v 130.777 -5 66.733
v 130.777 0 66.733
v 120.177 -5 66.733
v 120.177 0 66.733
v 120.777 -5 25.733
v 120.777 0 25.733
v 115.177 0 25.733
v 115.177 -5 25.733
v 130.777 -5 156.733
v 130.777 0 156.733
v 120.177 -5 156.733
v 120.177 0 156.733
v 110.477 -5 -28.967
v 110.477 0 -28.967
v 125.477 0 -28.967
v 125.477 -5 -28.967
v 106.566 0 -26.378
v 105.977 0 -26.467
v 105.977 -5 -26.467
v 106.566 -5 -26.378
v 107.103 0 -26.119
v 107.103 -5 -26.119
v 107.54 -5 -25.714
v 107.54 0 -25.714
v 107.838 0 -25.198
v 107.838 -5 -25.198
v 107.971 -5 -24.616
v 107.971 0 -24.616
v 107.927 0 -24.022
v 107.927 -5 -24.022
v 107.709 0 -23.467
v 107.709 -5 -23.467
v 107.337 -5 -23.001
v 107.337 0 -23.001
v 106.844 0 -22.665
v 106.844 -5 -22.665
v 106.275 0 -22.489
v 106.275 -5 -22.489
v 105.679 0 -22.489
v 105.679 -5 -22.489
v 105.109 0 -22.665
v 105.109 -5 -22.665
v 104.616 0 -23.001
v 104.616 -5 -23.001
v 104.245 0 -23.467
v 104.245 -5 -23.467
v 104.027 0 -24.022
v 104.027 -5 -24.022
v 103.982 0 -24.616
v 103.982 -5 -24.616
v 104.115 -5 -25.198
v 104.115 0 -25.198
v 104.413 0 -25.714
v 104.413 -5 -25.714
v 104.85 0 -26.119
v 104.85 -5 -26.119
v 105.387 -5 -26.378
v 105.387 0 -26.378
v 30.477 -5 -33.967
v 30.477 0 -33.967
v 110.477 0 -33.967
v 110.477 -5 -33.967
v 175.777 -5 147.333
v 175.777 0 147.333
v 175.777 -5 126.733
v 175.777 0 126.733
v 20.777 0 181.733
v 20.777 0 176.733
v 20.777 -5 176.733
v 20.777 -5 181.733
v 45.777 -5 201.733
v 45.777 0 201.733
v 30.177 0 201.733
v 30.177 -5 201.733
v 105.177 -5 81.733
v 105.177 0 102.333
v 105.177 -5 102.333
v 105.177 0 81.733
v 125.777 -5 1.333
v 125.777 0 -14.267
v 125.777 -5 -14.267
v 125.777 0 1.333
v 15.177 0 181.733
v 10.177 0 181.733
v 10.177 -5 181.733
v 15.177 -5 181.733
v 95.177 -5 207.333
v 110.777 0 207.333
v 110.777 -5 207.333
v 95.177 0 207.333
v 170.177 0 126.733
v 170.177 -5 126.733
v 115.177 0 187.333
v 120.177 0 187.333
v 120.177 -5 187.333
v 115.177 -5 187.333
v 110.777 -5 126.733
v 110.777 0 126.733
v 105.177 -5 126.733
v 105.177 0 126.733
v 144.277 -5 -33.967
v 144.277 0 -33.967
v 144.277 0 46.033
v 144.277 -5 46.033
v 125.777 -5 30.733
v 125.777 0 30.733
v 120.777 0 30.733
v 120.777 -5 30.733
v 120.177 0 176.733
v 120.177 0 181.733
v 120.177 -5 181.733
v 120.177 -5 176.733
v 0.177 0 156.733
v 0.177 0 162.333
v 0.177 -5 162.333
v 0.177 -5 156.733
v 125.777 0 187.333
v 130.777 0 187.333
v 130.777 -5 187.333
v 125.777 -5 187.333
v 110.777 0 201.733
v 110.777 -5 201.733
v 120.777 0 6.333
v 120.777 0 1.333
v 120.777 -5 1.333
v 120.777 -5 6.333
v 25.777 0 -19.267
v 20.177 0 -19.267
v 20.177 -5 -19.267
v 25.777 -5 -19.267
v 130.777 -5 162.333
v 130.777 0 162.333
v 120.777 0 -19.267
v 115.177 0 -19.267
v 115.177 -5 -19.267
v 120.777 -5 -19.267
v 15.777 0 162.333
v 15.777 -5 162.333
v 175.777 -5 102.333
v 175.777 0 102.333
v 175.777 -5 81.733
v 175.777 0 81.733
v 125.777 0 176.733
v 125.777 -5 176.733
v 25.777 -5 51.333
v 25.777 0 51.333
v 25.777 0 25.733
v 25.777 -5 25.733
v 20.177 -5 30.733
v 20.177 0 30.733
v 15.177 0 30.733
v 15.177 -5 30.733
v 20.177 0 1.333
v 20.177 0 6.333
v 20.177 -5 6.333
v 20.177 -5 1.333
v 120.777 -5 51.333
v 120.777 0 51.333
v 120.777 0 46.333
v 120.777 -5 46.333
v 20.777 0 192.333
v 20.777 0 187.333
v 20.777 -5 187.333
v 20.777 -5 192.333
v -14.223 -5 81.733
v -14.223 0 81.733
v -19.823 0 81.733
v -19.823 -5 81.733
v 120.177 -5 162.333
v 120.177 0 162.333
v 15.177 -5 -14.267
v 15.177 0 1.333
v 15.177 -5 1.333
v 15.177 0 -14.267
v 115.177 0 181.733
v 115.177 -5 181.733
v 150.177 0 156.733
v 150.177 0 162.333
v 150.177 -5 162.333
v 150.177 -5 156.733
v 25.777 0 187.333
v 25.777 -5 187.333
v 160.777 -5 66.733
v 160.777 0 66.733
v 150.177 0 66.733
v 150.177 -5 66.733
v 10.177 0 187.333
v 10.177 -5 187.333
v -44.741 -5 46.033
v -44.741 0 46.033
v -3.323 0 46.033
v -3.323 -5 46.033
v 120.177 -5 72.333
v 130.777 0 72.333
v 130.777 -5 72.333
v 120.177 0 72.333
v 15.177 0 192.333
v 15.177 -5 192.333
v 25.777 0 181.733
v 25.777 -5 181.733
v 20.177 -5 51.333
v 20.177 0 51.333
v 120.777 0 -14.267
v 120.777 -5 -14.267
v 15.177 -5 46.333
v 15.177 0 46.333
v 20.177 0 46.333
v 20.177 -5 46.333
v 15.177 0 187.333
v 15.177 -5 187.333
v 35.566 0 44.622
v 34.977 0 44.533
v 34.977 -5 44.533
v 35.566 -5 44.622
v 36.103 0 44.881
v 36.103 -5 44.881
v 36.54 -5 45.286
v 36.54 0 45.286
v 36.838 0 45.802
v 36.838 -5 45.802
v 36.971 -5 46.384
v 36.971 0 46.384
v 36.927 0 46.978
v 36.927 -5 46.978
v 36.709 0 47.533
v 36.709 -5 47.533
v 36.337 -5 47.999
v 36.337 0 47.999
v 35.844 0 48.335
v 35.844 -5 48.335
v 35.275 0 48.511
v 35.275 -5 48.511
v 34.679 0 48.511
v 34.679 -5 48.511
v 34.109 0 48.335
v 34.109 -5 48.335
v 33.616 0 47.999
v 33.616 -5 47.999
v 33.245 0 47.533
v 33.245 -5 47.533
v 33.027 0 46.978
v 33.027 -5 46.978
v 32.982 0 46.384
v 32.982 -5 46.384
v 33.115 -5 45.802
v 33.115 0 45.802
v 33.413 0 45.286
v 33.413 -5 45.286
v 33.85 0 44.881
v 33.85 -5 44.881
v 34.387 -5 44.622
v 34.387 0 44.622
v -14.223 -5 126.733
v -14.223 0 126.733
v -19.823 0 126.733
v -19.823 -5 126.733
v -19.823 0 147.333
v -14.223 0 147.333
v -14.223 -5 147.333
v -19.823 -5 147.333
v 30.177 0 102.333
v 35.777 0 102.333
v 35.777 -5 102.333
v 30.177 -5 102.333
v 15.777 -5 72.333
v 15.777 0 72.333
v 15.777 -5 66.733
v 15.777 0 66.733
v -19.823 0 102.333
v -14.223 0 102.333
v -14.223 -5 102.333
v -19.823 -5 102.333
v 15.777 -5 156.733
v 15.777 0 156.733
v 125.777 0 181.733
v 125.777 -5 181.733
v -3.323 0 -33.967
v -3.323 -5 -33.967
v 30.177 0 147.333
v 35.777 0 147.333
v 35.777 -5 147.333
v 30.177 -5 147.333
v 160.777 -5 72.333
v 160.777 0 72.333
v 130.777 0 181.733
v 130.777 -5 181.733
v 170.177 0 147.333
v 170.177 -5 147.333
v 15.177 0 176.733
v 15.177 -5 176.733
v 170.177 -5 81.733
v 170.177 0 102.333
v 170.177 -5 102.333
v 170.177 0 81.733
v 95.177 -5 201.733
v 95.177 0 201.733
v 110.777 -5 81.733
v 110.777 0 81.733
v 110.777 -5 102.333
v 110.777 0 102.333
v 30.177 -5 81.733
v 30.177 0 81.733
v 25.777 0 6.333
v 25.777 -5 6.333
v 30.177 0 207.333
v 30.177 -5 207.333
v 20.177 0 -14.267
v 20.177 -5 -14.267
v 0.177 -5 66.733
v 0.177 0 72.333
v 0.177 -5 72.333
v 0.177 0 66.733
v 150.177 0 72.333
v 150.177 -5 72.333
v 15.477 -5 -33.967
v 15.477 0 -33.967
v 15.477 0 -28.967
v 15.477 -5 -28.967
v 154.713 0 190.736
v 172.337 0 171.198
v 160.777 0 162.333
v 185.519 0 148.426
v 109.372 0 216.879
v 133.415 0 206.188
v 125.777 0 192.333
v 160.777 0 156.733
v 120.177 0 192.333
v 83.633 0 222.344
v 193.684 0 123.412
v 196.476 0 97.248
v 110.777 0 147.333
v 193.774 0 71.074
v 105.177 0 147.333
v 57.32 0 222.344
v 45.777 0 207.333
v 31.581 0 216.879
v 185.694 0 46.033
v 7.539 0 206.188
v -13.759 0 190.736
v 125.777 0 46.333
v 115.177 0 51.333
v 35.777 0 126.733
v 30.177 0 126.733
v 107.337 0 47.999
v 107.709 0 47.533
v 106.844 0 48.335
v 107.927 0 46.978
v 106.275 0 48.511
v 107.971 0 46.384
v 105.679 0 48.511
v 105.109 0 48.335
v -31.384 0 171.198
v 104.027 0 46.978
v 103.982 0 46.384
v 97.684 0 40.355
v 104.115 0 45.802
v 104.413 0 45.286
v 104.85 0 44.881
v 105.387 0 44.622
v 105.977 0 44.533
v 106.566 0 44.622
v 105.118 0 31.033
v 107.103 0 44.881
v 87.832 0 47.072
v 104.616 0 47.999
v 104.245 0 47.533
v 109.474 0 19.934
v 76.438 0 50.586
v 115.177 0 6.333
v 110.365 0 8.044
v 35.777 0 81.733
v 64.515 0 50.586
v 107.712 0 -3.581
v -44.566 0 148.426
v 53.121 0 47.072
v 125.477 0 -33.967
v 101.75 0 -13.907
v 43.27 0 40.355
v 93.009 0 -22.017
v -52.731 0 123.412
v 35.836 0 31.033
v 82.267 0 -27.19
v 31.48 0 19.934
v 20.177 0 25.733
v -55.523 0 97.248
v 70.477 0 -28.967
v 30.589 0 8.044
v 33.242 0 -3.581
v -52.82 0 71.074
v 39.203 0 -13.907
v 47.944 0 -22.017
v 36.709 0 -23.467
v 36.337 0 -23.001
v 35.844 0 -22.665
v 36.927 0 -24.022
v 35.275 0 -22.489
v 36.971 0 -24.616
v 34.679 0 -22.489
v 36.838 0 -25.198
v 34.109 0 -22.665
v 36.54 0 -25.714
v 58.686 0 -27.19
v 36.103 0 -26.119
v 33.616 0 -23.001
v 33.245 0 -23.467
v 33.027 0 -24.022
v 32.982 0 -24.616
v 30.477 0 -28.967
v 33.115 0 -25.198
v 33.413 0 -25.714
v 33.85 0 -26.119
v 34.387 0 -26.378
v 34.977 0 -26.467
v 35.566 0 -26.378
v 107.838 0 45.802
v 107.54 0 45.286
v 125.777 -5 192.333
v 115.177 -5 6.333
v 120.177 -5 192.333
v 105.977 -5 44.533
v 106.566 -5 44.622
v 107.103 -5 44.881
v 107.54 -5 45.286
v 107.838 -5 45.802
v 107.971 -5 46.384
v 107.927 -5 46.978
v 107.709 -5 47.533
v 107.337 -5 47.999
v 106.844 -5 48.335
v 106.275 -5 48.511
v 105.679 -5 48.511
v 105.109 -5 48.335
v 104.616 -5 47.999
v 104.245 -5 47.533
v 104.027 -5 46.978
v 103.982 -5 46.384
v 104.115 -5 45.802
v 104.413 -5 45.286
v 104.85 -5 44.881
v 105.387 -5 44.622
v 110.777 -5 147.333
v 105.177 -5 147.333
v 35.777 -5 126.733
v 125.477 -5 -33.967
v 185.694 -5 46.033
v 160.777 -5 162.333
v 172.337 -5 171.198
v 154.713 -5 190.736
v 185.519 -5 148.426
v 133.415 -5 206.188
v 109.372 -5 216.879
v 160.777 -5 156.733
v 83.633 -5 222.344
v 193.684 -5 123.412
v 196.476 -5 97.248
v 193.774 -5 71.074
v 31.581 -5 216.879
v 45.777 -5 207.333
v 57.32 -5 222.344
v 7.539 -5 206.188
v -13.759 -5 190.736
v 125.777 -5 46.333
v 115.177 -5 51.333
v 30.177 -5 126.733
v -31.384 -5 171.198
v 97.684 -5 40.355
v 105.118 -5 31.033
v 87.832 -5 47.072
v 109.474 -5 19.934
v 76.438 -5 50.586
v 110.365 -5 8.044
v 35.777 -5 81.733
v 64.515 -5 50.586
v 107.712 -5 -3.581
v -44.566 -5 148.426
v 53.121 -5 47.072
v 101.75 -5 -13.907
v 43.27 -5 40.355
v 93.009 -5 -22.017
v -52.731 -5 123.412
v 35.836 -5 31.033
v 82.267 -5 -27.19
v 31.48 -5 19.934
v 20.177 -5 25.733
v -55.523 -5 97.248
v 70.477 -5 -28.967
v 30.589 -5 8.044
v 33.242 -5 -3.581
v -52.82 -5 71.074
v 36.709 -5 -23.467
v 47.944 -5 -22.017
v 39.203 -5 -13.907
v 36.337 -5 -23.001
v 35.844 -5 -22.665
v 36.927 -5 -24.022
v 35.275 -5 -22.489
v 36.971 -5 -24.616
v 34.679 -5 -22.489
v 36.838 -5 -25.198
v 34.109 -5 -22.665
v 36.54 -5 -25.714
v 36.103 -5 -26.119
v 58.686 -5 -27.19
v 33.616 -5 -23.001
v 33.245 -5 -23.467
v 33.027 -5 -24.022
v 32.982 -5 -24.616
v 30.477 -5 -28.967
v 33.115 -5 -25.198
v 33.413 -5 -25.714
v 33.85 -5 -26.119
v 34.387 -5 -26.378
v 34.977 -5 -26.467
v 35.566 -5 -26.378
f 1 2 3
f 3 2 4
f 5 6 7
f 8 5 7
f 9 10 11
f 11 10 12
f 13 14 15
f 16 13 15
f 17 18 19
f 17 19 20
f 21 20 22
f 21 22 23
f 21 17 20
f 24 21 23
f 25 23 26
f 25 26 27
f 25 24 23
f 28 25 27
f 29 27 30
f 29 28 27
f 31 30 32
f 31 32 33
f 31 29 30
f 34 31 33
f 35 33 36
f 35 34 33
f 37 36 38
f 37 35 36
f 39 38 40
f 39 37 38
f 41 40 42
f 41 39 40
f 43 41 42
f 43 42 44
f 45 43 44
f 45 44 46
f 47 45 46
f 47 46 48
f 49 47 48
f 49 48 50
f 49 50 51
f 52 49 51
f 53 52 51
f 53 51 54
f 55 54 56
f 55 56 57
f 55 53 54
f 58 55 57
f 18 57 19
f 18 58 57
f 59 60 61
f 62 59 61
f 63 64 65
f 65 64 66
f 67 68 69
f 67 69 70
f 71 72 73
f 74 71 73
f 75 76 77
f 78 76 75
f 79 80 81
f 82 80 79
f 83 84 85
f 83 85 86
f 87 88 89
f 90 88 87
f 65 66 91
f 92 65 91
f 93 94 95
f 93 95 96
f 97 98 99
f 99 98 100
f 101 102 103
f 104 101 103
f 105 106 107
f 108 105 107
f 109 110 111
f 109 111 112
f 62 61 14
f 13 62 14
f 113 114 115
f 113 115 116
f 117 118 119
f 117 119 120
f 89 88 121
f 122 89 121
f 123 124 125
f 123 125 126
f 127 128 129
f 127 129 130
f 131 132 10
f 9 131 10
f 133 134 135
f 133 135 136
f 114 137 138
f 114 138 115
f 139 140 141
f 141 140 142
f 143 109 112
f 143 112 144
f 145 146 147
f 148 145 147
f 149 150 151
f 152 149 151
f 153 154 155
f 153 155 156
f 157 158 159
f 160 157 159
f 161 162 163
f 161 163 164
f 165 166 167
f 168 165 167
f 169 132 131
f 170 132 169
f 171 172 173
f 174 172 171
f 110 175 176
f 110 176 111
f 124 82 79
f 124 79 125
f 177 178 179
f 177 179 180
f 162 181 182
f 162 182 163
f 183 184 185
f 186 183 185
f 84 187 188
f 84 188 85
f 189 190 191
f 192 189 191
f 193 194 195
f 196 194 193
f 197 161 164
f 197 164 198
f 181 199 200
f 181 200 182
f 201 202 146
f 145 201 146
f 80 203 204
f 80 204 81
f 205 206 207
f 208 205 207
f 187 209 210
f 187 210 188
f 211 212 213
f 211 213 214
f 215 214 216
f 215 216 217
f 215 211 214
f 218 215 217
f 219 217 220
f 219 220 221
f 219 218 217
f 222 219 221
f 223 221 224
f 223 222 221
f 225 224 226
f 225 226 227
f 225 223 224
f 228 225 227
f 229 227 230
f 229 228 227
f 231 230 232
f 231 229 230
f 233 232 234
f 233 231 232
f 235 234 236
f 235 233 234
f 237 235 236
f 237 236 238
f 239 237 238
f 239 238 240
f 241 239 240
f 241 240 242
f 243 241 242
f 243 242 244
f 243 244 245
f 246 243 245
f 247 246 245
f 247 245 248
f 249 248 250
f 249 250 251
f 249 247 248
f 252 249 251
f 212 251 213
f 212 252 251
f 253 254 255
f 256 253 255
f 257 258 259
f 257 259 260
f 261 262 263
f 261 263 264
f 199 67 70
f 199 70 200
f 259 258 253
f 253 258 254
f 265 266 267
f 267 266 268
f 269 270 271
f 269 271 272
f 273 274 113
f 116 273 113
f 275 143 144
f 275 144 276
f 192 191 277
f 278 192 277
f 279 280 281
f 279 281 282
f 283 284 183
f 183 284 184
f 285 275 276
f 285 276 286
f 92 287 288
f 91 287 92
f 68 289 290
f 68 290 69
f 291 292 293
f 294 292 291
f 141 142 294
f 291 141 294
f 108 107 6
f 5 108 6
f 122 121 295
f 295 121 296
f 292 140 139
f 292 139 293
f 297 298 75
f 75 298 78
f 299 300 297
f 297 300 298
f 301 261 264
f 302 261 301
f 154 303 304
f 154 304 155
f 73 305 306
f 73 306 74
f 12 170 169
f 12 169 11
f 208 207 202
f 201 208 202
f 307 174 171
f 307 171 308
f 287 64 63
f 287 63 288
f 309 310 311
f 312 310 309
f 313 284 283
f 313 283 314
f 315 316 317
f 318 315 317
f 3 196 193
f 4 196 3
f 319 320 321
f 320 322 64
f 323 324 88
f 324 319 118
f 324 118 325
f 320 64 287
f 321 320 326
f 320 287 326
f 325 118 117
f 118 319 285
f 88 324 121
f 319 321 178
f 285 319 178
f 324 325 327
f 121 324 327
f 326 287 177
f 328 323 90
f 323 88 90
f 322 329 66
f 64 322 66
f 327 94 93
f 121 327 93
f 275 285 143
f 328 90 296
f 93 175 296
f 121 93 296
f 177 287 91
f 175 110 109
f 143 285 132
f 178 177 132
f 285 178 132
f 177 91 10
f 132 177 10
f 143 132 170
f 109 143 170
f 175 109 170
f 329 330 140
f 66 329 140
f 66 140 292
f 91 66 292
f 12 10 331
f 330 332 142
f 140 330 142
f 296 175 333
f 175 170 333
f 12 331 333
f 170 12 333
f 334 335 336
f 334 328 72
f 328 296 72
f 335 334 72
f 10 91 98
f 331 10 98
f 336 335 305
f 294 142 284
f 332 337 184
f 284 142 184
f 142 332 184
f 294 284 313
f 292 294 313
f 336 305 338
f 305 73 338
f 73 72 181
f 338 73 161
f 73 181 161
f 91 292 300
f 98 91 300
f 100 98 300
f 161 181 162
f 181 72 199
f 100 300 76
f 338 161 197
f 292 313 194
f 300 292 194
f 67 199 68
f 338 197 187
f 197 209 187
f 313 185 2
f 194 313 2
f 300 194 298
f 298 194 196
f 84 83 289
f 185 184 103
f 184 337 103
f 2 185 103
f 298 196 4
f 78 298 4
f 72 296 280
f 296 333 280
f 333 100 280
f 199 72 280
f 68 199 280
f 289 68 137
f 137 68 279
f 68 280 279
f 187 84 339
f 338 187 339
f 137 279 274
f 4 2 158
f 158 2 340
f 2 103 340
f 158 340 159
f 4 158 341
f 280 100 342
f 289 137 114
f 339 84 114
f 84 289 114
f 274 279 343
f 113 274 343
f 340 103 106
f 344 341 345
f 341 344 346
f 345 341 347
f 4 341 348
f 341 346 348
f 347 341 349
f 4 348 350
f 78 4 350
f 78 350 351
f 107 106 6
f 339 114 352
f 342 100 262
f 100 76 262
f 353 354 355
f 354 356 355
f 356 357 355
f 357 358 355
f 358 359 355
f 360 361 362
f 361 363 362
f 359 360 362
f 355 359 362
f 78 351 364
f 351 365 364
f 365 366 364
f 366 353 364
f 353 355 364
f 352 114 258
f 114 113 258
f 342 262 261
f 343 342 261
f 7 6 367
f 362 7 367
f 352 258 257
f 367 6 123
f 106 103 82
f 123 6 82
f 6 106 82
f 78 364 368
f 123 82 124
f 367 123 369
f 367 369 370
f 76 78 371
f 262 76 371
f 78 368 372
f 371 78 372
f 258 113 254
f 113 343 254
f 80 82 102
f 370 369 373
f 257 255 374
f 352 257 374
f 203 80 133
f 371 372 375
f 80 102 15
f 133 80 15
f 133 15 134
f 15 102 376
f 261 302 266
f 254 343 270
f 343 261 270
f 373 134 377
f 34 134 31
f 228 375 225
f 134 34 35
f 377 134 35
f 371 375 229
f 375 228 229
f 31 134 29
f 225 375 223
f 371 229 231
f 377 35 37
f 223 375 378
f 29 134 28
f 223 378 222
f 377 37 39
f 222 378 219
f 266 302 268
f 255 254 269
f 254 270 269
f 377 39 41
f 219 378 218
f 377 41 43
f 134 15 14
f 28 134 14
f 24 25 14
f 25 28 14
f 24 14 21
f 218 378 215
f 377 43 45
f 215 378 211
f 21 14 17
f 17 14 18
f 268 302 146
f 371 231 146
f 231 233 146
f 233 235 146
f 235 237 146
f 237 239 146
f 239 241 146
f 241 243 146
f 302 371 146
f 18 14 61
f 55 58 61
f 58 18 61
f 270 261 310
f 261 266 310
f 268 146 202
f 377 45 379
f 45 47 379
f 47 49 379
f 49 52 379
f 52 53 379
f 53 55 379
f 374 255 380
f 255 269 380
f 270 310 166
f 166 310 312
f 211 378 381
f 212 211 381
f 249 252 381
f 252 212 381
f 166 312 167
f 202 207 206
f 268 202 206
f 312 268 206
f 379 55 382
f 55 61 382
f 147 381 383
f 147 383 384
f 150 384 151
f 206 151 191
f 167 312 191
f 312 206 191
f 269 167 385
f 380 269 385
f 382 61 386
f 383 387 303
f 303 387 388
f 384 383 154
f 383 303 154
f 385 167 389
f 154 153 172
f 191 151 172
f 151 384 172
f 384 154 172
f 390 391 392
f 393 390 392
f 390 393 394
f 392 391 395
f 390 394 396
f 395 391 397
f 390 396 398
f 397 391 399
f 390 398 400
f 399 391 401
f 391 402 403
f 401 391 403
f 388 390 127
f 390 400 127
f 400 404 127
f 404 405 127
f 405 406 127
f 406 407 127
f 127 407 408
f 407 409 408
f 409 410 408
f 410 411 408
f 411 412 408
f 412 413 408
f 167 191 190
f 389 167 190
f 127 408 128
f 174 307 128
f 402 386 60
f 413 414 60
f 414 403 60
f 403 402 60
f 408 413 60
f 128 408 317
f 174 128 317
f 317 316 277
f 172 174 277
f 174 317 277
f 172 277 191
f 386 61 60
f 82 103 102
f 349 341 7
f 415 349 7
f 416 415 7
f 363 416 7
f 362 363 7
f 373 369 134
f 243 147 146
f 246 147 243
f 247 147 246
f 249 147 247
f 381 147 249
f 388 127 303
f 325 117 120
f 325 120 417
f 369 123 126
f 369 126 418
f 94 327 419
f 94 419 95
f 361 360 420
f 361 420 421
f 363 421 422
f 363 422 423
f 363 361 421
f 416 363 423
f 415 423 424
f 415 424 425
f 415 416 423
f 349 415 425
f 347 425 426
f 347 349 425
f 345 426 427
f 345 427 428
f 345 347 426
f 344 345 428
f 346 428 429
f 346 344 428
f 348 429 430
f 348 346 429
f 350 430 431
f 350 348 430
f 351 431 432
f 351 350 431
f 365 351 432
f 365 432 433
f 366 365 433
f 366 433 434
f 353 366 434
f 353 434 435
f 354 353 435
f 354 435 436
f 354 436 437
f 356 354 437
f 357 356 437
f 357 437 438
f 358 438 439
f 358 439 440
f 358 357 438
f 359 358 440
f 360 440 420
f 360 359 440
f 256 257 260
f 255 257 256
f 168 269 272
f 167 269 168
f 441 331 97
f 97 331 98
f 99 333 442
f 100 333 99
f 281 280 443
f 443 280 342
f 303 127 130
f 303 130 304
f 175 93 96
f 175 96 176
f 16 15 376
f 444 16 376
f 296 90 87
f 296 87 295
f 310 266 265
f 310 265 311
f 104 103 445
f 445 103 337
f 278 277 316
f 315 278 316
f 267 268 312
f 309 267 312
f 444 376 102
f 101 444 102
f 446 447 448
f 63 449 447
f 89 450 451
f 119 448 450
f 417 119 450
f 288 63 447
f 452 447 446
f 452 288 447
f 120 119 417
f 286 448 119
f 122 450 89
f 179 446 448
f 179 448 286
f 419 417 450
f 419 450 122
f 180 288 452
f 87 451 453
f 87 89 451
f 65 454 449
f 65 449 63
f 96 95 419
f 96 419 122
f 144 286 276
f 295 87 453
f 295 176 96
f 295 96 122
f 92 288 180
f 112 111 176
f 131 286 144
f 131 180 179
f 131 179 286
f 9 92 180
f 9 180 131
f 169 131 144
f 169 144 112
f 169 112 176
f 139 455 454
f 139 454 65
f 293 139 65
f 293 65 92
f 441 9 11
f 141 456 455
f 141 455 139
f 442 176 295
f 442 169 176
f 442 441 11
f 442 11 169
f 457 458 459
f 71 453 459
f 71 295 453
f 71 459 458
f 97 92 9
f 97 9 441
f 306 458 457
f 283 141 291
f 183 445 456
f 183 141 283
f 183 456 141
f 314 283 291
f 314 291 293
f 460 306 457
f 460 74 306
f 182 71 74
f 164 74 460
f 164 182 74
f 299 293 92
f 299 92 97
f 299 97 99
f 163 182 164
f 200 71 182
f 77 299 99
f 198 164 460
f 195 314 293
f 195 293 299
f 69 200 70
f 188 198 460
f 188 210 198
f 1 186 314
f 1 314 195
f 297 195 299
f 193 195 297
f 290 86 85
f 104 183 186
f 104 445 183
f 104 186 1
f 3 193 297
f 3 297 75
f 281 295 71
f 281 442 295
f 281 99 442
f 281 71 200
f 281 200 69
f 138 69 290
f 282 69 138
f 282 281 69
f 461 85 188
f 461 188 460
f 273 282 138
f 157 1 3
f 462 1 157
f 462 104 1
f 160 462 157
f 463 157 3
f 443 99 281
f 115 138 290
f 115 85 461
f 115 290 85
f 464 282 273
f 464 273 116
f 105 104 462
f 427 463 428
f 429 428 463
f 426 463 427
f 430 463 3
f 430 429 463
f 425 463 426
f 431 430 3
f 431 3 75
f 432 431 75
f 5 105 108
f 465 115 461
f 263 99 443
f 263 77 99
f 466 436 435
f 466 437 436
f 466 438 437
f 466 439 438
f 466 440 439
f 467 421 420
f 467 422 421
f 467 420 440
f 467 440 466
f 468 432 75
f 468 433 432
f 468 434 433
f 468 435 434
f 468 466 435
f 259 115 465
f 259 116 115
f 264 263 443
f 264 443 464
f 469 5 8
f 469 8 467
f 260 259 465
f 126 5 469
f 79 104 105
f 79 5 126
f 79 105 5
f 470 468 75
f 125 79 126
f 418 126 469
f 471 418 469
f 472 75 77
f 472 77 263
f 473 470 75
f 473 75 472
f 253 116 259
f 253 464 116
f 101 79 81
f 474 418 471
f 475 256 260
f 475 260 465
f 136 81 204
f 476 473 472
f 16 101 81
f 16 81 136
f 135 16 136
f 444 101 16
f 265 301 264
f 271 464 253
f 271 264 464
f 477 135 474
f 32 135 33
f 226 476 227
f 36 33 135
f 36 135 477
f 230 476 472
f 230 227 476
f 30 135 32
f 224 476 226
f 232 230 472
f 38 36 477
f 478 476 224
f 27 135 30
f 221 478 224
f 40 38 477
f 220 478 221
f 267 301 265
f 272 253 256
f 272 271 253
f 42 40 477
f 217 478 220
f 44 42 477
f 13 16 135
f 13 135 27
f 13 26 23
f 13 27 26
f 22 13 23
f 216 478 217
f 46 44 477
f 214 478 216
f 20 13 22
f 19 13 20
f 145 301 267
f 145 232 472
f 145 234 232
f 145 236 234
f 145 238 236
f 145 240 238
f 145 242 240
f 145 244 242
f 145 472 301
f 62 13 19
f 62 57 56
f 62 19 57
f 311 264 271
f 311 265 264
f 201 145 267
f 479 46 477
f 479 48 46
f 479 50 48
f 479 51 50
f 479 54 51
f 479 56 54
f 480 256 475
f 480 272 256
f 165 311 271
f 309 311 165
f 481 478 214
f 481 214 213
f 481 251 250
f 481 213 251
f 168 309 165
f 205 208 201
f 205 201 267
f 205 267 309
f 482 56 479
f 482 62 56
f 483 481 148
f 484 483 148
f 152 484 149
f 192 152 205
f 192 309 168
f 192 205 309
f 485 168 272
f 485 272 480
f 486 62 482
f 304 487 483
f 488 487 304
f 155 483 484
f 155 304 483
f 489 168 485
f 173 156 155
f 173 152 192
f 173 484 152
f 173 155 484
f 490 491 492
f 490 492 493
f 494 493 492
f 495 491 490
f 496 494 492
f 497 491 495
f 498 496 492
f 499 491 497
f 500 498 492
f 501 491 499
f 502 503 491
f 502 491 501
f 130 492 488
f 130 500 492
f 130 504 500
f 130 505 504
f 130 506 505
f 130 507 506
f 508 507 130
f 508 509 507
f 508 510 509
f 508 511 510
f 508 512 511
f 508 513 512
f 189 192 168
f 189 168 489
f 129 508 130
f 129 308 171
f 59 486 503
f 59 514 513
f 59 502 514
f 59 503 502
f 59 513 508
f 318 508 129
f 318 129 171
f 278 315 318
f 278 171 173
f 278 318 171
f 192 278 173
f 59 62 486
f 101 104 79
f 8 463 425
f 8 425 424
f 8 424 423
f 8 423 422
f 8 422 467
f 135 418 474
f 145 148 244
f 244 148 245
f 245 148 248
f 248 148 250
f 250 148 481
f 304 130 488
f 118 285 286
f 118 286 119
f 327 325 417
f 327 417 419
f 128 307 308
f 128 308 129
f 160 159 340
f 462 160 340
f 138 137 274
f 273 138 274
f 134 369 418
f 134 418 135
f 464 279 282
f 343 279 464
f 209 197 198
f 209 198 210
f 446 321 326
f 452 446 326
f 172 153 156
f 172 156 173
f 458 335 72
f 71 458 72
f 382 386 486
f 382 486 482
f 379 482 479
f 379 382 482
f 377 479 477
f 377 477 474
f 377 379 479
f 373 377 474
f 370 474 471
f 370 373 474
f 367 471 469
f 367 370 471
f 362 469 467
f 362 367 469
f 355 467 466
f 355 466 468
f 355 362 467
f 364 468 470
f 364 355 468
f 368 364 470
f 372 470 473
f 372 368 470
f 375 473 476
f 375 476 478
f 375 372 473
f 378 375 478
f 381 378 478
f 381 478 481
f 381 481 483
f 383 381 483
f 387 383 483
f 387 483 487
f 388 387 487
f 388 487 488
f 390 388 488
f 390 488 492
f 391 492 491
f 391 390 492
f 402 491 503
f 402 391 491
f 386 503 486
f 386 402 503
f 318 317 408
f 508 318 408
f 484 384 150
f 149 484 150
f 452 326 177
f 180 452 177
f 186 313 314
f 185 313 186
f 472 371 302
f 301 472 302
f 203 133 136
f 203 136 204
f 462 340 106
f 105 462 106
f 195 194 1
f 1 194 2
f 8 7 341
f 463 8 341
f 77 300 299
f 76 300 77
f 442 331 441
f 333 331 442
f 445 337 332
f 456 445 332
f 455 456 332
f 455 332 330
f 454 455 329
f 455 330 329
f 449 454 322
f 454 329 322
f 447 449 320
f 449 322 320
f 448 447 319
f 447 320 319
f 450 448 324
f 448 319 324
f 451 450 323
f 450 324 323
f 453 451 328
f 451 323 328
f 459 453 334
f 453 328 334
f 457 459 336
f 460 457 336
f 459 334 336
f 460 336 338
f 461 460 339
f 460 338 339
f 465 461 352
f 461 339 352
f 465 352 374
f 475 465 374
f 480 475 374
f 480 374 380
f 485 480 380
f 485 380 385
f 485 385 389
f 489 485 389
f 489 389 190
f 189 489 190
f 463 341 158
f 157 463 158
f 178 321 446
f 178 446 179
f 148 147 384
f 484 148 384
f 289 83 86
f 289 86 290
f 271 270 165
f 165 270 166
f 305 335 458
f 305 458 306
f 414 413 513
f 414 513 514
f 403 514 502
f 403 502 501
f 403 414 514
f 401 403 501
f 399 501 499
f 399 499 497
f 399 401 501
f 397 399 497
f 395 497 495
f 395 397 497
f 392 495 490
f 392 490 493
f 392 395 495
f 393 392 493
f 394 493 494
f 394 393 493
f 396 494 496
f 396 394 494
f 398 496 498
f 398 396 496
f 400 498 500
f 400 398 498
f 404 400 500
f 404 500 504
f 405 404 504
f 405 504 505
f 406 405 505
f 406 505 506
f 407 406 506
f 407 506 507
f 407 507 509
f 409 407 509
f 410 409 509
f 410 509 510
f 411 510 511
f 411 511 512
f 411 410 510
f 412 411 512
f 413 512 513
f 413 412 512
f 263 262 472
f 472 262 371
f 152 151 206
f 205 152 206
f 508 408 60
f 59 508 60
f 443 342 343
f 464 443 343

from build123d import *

# Parameters (mm, degrees)
SKETCH1_R           = 40
SKETCH1_R_2         = 2
SKETCH1_W           = 15.6
SKETCH1_H           = 5.6
SKETCH1_W_2         = 5.6
SKETCH1_H_2         = 20.6
SKETCH1_W_3         = 10.6
BOSS_EXTRUDE1_DEPTH = 5


with BuildPart() as part:
    # Sketch1 → Boss-Extrude1 (new body)
    with BuildSketch(Plane(origin=(0, 0, 0), x_dir=(-1, 0, 0), z_dir=(0, -1, 0))):
        with BuildLine():
            Line((-144.276672243, 28.966950724), (-144.276672243, -46.033049276))
            Line((-144.276672243, -46.033049276), (-185.693858461, -46.033049276))
            ThreePointArc((-185.693858461, -46.033049276), (-70.476672243, -223.033049276), (44.740513975, -46.033049276))
            Line((44.740513975, -46.033049276), (3.323327757, -46.033049276))
            Line((3.323327757, -46.033049276), (3.323327757, 28.966950724))
            Line((3.323327757, 28.966950724), (3.323327757, 33.966950724))
            Line((3.323327757, 33.966950724), (-15.476672243, 33.966950724))
            Line((-15.476672243, 33.966950724), (-15.476672243, 28.966950724))
            Line((-15.476672243, 28.966950724), (-30.476672243, 28.966950724))
            Line((-30.476672243, 28.966950724), (-30.476672243, 33.966950724))
            Line((-30.476672243, 33.966950724), (-110.476672243, 33.966950724))
            Line((-110.476672243, 33.966950724), (-110.476672243, 28.966950724))
            Line((-110.476672243, 28.966950724), (-125.476672243, 28.966950724))
            Line((-125.476672243, 28.966950724), (-125.476672243, 33.966950724))
            Line((-125.476672243, 33.966950724), (-144.276672243, 33.966950724))
            Line((-144.276672243, 33.966950724), (-144.276672243, 28.966950724))
        make_face()
        with Locations(Location((-70.476672243, -11.033049276, 0), (0, 0, 90))):
            Circle(SKETCH1_R, mode=Mode.SUBTRACT)
        with Locations(Location((-34.976672243, 24.466950724, 0), (0, 0, 90))):
            Circle(SKETCH1_R_2, mode=Mode.SUBTRACT)
        with Locations(Location((-105.976672243, 24.466950724, 0), (0, 0, 90))):
            Circle(SKETCH1_R_2, mode=Mode.SUBTRACT)
        with Locations(Location((-105.976672243, -46.533049276, 0), (0, 0, 90))):
            Circle(SKETCH1_R_2, mode=Mode.SUBTRACT)
        with Locations(Location((-34.976672243, -46.533049276, 0), (0, 0, 90))):
            Circle(SKETCH1_R_2, mode=Mode.SUBTRACT)
        Polygon((-20.176672243, -6.333049276), (-20.176672243, -1.333049276), (-15.176672243, -1.333049276), (-15.176672243, 14.266950724), (-20.176672243, 14.266950724), (-20.176672243, 19.266950724), (-25.776672243, 19.266950724), (-25.776672243, -6.333049276), align=None, mode=Mode.SUBTRACT)
        Polygon((-20.176672243, -25.733049276), (-20.176672243, -30.733049276), (-15.176672243, -30.733049276), (-15.176672243, -46.333049276), (-20.176672243, -46.333049276), (-20.176672243, -51.333049276), (-25.776672243, -51.333049276), (-25.776672243, -25.733049276), align=None, mode=Mode.SUBTRACT)
        Polygon((-120.776672243, -6.333049276), (-115.176672243, -6.333049276), (-115.176672243, 19.266950724), (-120.776672243, 19.266950724), (-120.776672243, 14.266950724), (-125.776672243, 14.266950724), (-125.776672243, -1.333049276), (-120.776672243, -1.333049276), align=None, mode=Mode.SUBTRACT)
        Polygon((-120.776672243, -25.733049276), (-115.176672243, -25.733049276), (-115.176672243, -51.333049276), (-120.776672243, -51.333049276), (-120.776672243, -46.333049276), (-125.776672243, -46.333049276), (-125.776672243, -30.733049276), (-120.776672243, -30.733049276), align=None, mode=Mode.SUBTRACT)
        with Locations((-7.976672243, -69.533049276)):
            Rectangle(SKETCH1_W, SKETCH1_H, mode=Mode.SUBTRACT)
        with Locations((17.023327757, -92.033049276)):
            Rectangle(SKETCH1_W_2, SKETCH1_H_2, mode=Mode.SUBTRACT)
        with Locations((17.023327757, -137.033049276)):
            Rectangle(SKETCH1_W_2, SKETCH1_H_2, mode=Mode.SUBTRACT)
        with Locations((-7.976672243, -159.533049276)):
            Rectangle(SKETCH1_W, SKETCH1_H, mode=Mode.SUBTRACT)
        with Locations((-32.976672243, -137.033049276)):
            Rectangle(SKETCH1_W_2, SKETCH1_H_2, mode=Mode.SUBTRACT)
        with Locations((-32.976672243, -92.033049276)):
            Rectangle(SKETCH1_W_2, SKETCH1_H_2, mode=Mode.SUBTRACT)
        with Locations((-37.976672243, -204.533049276)):
            Rectangle(SKETCH1_W, SKETCH1_H, mode=Mode.SUBTRACT)
        Polygon((-20.776672243, -176.733049276), (-20.776672243, -181.733049276), (-25.776672243, -181.733049276), (-25.776672243, -187.333049276), (-20.776672243, -187.333049276), (-20.776672243, -192.333049276), (-15.176672243, -192.333049276), (-15.176672243, -187.333049276), (-10.176672243, -187.333049276), (-10.176672243, -181.733049276), (-15.176672243, -181.733049276), (-15.176672243, -176.733049276), align=None, mode=Mode.SUBTRACT)
        with Locations((-102.976672243, -204.533049276)):
            Rectangle(SKETCH1_W, SKETCH1_H, mode=Mode.SUBTRACT)
        Polygon((-120.176672243, -176.733049276), (-125.776672243, -176.733049276), (-125.776672243, -181.733049276), (-130.776672243, -181.733049276), (-130.776672243, -187.333049276), (-125.776672243, -187.333049276), (-125.776672243, -192.333049276), (-120.176672243, -192.333049276), (-120.176672243, -187.333049276), (-115.176672243, -187.333049276), (-115.176672243, -181.733049276), (-120.176672243, -181.733049276), align=None, mode=Mode.SUBTRACT)
        with Locations((-125.476672243, -159.533049276)):
            Rectangle(SKETCH1_W_3, SKETCH1_H, mode=Mode.SUBTRACT)
        with Locations((-155.476672243, -159.533049276)):
            Rectangle(SKETCH1_W_3, SKETCH1_H, mode=Mode.SUBTRACT)
        with Locations((-107.976672243, -137.033049276)):
            Rectangle(SKETCH1_W_2, SKETCH1_H_2, mode=Mode.SUBTRACT)
        with Locations((-172.976672243, -137.033049276)):
            Rectangle(SKETCH1_W_2, SKETCH1_H_2, mode=Mode.SUBTRACT)
        with Locations((-172.976672243, -92.033049276)):
            Rectangle(SKETCH1_W_2, SKETCH1_H_2, mode=Mode.SUBTRACT)
        with Locations((-107.976672243, -92.033049276)):
            Rectangle(SKETCH1_W_2, SKETCH1_H_2, mode=Mode.SUBTRACT)
        with Locations((-125.476672243, -69.533049276)):
            Rectangle(SKETCH1_W_3, SKETCH1_H, mode=Mode.SUBTRACT)
        with Locations((-155.476672243, -69.533049276)):
            Rectangle(SKETCH1_W_3, SKETCH1_H, mode=Mode.SUBTRACT)
    extrude(amount=BOSS_EXTRUDE1_DEPTH)


solid = part.part
